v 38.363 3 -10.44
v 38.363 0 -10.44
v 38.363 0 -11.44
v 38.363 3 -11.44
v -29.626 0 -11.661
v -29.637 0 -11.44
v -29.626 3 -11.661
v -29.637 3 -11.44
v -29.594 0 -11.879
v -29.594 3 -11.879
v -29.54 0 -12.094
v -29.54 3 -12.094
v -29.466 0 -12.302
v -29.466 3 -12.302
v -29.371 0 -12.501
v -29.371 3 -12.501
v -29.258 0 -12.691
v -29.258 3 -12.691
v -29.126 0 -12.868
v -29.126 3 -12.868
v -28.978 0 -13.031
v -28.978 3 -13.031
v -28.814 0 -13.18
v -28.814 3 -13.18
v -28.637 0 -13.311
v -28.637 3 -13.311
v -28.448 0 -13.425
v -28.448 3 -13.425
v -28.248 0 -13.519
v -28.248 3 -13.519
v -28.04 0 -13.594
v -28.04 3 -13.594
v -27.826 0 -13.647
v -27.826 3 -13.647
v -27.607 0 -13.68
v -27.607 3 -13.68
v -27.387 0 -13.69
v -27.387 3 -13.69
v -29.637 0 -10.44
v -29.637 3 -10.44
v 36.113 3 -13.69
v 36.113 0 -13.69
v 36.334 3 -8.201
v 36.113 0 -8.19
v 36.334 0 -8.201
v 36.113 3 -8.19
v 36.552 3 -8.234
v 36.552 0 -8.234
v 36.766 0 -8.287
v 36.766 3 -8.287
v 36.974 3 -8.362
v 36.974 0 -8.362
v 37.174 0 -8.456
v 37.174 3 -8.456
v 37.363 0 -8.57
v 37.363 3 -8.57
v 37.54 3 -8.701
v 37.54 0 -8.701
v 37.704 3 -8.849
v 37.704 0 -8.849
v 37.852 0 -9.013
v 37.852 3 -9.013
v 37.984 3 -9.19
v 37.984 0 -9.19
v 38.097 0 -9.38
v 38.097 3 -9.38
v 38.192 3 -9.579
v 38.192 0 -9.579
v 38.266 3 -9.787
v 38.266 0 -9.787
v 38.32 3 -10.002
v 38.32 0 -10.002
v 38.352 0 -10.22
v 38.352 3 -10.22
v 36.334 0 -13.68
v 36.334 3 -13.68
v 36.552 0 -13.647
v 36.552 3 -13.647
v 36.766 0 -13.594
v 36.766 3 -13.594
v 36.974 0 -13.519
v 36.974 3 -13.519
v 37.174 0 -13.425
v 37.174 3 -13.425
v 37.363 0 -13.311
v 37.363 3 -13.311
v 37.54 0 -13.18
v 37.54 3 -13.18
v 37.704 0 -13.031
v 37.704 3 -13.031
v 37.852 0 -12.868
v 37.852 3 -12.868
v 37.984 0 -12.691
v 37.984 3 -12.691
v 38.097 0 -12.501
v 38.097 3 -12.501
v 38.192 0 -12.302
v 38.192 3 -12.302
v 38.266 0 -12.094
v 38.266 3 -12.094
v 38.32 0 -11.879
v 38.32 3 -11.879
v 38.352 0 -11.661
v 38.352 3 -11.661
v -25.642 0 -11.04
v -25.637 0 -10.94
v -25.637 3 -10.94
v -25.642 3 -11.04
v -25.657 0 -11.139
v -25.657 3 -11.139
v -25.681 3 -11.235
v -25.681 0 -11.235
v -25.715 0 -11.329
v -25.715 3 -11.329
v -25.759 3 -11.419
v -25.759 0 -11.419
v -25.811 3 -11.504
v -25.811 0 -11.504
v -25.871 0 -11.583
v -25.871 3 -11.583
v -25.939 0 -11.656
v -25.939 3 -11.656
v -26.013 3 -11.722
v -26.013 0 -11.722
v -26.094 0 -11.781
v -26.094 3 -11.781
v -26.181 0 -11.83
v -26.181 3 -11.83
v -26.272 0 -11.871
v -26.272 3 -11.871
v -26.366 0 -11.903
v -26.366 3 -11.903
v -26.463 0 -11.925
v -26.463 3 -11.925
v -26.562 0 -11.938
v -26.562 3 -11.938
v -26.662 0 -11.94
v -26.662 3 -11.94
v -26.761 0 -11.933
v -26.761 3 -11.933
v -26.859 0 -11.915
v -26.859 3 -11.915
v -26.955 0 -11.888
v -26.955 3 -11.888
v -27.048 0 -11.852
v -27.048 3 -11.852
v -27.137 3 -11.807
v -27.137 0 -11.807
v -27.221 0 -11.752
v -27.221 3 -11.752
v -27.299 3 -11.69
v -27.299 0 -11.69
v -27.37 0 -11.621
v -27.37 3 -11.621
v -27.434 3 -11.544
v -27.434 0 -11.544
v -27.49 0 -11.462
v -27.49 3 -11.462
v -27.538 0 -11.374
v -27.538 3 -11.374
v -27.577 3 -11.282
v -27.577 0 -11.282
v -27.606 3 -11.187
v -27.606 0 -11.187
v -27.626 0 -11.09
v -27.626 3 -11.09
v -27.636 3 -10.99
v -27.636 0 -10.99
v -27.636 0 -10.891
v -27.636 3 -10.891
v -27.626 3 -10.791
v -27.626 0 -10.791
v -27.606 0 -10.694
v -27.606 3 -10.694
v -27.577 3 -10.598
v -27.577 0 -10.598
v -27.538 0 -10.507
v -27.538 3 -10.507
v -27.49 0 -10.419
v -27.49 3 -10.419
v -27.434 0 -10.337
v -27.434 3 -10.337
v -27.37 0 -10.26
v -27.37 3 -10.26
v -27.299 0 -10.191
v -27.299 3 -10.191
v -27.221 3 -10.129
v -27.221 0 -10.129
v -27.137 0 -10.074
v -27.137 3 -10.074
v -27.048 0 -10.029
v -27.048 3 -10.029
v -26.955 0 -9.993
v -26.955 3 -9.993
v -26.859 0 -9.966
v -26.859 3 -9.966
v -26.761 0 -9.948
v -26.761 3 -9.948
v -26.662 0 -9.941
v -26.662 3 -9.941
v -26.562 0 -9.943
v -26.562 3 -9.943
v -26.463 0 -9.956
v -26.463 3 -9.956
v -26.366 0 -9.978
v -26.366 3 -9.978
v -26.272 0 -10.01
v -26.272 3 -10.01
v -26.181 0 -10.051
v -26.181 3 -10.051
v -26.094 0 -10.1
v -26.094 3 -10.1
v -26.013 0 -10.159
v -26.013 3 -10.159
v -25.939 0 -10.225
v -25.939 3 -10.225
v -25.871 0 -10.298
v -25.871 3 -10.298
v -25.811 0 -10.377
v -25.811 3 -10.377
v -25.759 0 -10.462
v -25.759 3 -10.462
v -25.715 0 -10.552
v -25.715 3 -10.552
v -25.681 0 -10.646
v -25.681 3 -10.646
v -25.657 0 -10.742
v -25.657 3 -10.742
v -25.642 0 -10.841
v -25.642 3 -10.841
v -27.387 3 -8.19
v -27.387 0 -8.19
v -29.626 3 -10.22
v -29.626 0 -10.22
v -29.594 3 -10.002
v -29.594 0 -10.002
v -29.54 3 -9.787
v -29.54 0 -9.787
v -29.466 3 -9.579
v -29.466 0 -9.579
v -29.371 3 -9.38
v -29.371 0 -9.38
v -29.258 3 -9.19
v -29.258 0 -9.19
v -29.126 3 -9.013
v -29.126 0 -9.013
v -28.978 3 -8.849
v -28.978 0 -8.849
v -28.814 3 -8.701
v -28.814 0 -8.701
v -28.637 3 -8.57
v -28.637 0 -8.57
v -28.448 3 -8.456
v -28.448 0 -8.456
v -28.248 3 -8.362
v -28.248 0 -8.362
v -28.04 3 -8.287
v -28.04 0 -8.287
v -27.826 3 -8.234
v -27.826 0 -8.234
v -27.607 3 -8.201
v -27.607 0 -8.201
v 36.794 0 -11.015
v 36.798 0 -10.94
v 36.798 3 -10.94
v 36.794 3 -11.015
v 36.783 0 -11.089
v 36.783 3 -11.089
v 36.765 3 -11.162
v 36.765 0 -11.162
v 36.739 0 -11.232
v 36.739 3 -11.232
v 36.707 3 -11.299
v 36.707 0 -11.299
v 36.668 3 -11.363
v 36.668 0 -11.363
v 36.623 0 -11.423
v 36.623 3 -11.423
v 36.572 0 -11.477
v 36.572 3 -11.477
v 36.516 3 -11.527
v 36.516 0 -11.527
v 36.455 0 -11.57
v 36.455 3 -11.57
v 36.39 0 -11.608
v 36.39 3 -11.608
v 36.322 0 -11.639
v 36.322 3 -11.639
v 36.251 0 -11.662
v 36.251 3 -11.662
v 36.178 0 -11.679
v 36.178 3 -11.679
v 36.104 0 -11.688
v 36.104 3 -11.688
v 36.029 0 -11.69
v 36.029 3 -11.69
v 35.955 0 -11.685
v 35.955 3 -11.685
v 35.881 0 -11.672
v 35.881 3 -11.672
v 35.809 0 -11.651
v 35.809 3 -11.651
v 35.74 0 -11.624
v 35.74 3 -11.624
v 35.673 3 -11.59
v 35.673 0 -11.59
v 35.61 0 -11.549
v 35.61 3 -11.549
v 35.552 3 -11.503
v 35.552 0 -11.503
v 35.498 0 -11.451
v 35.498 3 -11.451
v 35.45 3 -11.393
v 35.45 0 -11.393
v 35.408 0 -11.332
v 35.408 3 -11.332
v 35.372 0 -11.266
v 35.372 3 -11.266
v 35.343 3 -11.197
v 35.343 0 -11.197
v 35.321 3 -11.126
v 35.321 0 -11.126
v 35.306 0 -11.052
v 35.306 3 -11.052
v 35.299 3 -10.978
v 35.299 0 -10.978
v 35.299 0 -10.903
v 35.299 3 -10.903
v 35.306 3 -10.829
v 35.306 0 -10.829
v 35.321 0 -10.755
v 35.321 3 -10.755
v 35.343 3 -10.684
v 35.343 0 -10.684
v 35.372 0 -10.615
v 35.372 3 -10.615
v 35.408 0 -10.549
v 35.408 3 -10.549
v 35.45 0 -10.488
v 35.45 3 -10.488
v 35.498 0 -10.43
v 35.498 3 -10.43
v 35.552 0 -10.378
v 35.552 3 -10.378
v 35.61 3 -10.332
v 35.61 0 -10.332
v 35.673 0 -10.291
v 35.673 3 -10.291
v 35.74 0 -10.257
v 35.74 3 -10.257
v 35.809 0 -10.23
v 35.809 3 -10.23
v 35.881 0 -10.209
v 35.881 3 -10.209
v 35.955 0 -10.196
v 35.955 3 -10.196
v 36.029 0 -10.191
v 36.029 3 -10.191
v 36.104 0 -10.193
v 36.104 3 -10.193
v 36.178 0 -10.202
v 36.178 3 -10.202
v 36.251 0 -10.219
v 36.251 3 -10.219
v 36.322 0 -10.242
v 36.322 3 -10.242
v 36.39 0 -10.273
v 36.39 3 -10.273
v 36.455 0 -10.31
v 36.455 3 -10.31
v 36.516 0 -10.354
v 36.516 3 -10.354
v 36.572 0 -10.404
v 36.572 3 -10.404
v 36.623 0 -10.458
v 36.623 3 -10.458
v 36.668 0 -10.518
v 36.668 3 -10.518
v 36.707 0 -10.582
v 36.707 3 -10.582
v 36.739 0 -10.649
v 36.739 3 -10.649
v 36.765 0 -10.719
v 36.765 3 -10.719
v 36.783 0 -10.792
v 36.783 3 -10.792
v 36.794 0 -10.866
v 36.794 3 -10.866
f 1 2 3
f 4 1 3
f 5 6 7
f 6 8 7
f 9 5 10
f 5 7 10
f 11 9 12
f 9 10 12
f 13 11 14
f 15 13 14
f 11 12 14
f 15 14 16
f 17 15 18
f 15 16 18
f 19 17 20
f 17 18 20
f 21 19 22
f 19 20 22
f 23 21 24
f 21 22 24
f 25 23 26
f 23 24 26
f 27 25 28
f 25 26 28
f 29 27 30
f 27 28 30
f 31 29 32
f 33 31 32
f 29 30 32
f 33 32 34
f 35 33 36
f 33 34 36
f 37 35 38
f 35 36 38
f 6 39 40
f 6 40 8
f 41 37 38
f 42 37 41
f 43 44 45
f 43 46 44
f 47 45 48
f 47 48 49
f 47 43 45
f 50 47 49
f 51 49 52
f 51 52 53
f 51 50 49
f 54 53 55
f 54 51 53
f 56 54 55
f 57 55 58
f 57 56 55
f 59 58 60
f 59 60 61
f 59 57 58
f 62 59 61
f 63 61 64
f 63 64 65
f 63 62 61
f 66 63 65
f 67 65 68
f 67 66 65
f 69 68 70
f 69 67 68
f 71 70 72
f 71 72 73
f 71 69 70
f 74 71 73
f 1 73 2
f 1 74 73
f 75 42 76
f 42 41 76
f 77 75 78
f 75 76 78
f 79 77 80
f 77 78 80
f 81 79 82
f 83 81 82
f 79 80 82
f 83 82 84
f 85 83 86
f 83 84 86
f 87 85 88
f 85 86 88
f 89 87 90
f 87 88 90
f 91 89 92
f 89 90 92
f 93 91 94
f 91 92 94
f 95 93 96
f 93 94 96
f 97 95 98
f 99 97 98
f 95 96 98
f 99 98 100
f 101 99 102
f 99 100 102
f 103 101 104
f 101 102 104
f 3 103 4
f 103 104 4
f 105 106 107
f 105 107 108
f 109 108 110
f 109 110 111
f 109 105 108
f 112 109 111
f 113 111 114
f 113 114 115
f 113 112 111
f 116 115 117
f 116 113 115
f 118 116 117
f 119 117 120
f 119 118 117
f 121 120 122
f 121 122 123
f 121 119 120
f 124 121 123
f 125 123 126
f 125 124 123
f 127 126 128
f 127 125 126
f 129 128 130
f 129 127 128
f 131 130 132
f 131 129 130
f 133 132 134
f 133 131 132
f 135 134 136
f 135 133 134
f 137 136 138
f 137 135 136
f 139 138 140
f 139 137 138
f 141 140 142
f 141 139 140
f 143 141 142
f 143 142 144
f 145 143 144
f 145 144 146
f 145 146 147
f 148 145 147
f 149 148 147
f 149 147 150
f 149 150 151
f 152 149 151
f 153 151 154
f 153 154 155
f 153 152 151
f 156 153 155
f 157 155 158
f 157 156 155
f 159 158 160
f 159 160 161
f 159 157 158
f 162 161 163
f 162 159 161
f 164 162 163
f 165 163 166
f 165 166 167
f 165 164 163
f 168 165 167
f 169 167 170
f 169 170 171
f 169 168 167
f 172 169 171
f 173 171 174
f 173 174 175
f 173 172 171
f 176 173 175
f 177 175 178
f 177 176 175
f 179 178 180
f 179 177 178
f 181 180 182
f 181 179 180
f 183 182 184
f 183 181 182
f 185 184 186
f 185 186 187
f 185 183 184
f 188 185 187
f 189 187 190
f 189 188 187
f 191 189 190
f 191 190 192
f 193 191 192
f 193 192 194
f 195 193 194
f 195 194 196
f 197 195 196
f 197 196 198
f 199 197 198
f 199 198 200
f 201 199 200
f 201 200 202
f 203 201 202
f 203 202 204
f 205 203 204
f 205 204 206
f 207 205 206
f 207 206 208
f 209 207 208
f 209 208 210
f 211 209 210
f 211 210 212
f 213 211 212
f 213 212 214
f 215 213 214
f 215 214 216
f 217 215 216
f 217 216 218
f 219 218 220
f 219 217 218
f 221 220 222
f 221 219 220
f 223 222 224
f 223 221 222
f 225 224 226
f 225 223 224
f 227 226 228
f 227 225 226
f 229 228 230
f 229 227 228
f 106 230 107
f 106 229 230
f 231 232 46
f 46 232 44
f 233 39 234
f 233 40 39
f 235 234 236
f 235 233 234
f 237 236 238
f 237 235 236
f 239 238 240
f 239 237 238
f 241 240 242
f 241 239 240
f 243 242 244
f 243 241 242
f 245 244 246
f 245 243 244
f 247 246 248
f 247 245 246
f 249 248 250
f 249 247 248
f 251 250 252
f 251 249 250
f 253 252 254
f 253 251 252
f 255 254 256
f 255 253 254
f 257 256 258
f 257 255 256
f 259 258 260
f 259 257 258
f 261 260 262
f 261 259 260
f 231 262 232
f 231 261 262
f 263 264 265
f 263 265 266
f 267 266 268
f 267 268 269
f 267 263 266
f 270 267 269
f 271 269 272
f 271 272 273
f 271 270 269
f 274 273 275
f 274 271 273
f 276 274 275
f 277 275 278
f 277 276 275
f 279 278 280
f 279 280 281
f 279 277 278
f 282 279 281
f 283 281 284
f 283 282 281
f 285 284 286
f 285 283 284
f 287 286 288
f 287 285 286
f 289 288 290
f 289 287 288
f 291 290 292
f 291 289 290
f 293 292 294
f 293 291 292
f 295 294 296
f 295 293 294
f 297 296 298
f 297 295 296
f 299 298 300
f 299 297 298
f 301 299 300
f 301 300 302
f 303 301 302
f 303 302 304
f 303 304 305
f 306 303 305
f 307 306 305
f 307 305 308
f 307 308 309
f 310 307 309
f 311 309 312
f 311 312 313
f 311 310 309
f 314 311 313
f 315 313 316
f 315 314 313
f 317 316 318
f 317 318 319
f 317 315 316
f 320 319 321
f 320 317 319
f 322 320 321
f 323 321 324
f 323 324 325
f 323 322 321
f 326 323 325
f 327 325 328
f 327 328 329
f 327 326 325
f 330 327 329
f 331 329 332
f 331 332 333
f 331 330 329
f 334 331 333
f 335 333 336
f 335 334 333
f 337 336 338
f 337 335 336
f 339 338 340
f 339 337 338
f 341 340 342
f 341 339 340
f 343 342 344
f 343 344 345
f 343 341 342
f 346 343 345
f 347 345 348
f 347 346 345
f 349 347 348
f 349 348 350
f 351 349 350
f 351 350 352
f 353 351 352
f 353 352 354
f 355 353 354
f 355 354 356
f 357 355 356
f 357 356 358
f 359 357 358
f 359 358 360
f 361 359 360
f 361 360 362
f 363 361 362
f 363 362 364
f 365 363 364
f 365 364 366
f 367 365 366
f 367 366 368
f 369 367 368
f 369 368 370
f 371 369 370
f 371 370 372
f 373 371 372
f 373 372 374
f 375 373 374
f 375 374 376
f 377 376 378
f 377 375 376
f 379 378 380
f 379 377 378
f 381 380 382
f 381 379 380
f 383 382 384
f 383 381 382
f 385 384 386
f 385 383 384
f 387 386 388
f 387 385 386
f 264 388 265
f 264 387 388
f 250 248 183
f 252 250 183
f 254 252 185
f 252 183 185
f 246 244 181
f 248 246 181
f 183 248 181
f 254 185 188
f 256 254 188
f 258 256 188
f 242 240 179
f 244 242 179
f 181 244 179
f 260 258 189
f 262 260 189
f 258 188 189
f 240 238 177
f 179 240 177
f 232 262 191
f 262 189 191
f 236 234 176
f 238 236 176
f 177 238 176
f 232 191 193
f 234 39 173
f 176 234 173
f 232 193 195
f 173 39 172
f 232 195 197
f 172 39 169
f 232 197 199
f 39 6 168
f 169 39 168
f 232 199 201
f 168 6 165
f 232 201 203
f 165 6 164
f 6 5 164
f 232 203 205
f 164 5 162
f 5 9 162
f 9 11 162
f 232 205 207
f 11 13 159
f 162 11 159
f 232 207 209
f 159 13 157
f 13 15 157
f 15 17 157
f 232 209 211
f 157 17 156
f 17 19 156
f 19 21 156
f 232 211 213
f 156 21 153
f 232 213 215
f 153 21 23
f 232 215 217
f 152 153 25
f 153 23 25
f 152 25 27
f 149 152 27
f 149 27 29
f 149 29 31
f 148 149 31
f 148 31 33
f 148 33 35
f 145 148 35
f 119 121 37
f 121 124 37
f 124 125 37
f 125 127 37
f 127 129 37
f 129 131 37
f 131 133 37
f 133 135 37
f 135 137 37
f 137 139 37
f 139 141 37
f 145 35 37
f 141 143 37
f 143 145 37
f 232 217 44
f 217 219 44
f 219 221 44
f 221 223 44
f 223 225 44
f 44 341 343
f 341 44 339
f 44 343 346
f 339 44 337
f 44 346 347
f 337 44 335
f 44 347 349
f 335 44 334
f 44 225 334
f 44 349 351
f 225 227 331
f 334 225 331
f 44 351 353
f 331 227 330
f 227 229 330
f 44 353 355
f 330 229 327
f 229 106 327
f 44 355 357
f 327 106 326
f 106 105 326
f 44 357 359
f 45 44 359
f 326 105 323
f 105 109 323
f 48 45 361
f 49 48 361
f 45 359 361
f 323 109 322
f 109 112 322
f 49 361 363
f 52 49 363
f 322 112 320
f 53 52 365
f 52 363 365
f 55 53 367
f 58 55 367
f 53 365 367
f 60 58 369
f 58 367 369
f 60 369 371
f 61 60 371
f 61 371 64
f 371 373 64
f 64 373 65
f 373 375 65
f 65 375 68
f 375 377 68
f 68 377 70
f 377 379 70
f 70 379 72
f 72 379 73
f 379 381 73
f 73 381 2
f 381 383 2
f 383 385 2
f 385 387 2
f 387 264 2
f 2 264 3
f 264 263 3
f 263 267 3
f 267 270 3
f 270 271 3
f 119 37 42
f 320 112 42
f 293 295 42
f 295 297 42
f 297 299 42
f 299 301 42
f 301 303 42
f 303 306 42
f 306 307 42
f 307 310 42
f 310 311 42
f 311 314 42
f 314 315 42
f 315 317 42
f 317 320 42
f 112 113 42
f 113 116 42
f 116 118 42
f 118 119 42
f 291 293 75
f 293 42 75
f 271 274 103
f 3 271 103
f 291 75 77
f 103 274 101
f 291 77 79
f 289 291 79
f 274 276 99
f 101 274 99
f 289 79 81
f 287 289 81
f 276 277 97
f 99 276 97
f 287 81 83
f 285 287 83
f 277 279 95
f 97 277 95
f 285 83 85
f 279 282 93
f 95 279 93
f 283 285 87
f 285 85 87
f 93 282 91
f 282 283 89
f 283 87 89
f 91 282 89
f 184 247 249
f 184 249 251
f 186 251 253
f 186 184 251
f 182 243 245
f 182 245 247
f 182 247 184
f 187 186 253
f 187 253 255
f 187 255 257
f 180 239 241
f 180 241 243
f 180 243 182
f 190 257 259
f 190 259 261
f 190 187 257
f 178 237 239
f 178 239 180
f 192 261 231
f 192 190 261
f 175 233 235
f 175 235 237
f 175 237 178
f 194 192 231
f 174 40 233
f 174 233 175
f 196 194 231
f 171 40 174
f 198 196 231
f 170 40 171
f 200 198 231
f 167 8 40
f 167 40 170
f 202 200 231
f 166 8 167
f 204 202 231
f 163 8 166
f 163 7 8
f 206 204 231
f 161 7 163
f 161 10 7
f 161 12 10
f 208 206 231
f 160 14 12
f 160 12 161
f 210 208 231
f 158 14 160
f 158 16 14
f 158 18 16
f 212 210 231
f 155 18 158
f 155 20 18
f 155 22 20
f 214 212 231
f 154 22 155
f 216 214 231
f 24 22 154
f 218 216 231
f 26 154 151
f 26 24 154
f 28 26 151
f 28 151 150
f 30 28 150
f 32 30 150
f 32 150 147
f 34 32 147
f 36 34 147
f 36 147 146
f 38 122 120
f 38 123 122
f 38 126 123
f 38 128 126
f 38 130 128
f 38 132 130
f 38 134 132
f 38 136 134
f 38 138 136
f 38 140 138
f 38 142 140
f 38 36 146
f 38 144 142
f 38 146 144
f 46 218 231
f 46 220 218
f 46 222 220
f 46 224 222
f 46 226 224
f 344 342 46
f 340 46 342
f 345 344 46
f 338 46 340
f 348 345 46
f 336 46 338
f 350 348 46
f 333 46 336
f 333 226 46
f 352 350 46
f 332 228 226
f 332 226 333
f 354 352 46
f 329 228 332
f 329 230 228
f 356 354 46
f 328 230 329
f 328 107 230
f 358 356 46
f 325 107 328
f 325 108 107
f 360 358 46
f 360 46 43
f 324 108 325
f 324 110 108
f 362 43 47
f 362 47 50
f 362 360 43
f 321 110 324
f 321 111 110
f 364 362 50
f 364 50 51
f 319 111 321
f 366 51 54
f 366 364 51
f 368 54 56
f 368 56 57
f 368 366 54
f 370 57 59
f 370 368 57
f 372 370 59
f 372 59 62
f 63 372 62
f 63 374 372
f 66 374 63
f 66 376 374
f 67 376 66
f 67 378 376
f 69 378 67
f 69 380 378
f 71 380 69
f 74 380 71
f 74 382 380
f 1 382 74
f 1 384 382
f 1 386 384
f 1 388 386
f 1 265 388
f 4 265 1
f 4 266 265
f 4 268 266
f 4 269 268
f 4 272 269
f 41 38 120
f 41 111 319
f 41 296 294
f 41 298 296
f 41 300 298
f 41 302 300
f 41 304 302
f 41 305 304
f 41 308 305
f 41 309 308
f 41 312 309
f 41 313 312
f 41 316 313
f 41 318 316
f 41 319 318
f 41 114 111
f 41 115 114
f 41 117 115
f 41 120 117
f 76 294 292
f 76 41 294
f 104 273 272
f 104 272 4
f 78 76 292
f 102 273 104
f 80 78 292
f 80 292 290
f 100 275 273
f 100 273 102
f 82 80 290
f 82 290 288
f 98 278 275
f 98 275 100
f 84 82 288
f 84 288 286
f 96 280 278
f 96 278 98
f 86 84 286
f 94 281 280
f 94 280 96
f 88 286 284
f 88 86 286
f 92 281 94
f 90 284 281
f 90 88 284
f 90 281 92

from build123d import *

# Parameters (mm, degrees)
CROQUIS1_W              = 68
CROQUIS1_H              = 5.5
CROQUIS1_R              = 0.75
CROQUIS1_R_2            = 1
SALIENTE_EXTRUIR1_DEPTH = 3
REDONDEO1_R             = 2.25


with BuildPart() as part:
    # Croquis1 → Saliente-Extruir1 (new body)
    with BuildSketch(Plane(origin=(0, 0, 0), x_dir=(1, 0, 0), z_dir=(0, 1, 0))):
        with Locations((4.363095238, 10.94047619)):
            Rectangle(CROQUIS1_W, CROQUIS1_H)
        with Locations((36.048095238, 10.94047619)):
            Circle(CROQUIS1_R, mode=Mode.SUBTRACT)
        with Locations((-26.636904762, 10.94047619)):
            Circle(CROQUIS1_R_2, mode=Mode.SUBTRACT)
    extrude(amount=SALIENTE_EXTRUIR1_DEPTH)

    # Redondeo1
    redondeo1_edges = [part.edges().sort_by_distance(p)[0] for p in [
        (-29.636904762, 1.5, -13.69047619),
        (38.363095238, 1.5, -13.69047619),
        (38.363095238, 1.5, -8.19047619),
        (-29.636904762, 1.5, -8.19047619),
    ]]
    fillet(redondeo1_edges, radius=REDONDEO1_R)


solid = part.part
